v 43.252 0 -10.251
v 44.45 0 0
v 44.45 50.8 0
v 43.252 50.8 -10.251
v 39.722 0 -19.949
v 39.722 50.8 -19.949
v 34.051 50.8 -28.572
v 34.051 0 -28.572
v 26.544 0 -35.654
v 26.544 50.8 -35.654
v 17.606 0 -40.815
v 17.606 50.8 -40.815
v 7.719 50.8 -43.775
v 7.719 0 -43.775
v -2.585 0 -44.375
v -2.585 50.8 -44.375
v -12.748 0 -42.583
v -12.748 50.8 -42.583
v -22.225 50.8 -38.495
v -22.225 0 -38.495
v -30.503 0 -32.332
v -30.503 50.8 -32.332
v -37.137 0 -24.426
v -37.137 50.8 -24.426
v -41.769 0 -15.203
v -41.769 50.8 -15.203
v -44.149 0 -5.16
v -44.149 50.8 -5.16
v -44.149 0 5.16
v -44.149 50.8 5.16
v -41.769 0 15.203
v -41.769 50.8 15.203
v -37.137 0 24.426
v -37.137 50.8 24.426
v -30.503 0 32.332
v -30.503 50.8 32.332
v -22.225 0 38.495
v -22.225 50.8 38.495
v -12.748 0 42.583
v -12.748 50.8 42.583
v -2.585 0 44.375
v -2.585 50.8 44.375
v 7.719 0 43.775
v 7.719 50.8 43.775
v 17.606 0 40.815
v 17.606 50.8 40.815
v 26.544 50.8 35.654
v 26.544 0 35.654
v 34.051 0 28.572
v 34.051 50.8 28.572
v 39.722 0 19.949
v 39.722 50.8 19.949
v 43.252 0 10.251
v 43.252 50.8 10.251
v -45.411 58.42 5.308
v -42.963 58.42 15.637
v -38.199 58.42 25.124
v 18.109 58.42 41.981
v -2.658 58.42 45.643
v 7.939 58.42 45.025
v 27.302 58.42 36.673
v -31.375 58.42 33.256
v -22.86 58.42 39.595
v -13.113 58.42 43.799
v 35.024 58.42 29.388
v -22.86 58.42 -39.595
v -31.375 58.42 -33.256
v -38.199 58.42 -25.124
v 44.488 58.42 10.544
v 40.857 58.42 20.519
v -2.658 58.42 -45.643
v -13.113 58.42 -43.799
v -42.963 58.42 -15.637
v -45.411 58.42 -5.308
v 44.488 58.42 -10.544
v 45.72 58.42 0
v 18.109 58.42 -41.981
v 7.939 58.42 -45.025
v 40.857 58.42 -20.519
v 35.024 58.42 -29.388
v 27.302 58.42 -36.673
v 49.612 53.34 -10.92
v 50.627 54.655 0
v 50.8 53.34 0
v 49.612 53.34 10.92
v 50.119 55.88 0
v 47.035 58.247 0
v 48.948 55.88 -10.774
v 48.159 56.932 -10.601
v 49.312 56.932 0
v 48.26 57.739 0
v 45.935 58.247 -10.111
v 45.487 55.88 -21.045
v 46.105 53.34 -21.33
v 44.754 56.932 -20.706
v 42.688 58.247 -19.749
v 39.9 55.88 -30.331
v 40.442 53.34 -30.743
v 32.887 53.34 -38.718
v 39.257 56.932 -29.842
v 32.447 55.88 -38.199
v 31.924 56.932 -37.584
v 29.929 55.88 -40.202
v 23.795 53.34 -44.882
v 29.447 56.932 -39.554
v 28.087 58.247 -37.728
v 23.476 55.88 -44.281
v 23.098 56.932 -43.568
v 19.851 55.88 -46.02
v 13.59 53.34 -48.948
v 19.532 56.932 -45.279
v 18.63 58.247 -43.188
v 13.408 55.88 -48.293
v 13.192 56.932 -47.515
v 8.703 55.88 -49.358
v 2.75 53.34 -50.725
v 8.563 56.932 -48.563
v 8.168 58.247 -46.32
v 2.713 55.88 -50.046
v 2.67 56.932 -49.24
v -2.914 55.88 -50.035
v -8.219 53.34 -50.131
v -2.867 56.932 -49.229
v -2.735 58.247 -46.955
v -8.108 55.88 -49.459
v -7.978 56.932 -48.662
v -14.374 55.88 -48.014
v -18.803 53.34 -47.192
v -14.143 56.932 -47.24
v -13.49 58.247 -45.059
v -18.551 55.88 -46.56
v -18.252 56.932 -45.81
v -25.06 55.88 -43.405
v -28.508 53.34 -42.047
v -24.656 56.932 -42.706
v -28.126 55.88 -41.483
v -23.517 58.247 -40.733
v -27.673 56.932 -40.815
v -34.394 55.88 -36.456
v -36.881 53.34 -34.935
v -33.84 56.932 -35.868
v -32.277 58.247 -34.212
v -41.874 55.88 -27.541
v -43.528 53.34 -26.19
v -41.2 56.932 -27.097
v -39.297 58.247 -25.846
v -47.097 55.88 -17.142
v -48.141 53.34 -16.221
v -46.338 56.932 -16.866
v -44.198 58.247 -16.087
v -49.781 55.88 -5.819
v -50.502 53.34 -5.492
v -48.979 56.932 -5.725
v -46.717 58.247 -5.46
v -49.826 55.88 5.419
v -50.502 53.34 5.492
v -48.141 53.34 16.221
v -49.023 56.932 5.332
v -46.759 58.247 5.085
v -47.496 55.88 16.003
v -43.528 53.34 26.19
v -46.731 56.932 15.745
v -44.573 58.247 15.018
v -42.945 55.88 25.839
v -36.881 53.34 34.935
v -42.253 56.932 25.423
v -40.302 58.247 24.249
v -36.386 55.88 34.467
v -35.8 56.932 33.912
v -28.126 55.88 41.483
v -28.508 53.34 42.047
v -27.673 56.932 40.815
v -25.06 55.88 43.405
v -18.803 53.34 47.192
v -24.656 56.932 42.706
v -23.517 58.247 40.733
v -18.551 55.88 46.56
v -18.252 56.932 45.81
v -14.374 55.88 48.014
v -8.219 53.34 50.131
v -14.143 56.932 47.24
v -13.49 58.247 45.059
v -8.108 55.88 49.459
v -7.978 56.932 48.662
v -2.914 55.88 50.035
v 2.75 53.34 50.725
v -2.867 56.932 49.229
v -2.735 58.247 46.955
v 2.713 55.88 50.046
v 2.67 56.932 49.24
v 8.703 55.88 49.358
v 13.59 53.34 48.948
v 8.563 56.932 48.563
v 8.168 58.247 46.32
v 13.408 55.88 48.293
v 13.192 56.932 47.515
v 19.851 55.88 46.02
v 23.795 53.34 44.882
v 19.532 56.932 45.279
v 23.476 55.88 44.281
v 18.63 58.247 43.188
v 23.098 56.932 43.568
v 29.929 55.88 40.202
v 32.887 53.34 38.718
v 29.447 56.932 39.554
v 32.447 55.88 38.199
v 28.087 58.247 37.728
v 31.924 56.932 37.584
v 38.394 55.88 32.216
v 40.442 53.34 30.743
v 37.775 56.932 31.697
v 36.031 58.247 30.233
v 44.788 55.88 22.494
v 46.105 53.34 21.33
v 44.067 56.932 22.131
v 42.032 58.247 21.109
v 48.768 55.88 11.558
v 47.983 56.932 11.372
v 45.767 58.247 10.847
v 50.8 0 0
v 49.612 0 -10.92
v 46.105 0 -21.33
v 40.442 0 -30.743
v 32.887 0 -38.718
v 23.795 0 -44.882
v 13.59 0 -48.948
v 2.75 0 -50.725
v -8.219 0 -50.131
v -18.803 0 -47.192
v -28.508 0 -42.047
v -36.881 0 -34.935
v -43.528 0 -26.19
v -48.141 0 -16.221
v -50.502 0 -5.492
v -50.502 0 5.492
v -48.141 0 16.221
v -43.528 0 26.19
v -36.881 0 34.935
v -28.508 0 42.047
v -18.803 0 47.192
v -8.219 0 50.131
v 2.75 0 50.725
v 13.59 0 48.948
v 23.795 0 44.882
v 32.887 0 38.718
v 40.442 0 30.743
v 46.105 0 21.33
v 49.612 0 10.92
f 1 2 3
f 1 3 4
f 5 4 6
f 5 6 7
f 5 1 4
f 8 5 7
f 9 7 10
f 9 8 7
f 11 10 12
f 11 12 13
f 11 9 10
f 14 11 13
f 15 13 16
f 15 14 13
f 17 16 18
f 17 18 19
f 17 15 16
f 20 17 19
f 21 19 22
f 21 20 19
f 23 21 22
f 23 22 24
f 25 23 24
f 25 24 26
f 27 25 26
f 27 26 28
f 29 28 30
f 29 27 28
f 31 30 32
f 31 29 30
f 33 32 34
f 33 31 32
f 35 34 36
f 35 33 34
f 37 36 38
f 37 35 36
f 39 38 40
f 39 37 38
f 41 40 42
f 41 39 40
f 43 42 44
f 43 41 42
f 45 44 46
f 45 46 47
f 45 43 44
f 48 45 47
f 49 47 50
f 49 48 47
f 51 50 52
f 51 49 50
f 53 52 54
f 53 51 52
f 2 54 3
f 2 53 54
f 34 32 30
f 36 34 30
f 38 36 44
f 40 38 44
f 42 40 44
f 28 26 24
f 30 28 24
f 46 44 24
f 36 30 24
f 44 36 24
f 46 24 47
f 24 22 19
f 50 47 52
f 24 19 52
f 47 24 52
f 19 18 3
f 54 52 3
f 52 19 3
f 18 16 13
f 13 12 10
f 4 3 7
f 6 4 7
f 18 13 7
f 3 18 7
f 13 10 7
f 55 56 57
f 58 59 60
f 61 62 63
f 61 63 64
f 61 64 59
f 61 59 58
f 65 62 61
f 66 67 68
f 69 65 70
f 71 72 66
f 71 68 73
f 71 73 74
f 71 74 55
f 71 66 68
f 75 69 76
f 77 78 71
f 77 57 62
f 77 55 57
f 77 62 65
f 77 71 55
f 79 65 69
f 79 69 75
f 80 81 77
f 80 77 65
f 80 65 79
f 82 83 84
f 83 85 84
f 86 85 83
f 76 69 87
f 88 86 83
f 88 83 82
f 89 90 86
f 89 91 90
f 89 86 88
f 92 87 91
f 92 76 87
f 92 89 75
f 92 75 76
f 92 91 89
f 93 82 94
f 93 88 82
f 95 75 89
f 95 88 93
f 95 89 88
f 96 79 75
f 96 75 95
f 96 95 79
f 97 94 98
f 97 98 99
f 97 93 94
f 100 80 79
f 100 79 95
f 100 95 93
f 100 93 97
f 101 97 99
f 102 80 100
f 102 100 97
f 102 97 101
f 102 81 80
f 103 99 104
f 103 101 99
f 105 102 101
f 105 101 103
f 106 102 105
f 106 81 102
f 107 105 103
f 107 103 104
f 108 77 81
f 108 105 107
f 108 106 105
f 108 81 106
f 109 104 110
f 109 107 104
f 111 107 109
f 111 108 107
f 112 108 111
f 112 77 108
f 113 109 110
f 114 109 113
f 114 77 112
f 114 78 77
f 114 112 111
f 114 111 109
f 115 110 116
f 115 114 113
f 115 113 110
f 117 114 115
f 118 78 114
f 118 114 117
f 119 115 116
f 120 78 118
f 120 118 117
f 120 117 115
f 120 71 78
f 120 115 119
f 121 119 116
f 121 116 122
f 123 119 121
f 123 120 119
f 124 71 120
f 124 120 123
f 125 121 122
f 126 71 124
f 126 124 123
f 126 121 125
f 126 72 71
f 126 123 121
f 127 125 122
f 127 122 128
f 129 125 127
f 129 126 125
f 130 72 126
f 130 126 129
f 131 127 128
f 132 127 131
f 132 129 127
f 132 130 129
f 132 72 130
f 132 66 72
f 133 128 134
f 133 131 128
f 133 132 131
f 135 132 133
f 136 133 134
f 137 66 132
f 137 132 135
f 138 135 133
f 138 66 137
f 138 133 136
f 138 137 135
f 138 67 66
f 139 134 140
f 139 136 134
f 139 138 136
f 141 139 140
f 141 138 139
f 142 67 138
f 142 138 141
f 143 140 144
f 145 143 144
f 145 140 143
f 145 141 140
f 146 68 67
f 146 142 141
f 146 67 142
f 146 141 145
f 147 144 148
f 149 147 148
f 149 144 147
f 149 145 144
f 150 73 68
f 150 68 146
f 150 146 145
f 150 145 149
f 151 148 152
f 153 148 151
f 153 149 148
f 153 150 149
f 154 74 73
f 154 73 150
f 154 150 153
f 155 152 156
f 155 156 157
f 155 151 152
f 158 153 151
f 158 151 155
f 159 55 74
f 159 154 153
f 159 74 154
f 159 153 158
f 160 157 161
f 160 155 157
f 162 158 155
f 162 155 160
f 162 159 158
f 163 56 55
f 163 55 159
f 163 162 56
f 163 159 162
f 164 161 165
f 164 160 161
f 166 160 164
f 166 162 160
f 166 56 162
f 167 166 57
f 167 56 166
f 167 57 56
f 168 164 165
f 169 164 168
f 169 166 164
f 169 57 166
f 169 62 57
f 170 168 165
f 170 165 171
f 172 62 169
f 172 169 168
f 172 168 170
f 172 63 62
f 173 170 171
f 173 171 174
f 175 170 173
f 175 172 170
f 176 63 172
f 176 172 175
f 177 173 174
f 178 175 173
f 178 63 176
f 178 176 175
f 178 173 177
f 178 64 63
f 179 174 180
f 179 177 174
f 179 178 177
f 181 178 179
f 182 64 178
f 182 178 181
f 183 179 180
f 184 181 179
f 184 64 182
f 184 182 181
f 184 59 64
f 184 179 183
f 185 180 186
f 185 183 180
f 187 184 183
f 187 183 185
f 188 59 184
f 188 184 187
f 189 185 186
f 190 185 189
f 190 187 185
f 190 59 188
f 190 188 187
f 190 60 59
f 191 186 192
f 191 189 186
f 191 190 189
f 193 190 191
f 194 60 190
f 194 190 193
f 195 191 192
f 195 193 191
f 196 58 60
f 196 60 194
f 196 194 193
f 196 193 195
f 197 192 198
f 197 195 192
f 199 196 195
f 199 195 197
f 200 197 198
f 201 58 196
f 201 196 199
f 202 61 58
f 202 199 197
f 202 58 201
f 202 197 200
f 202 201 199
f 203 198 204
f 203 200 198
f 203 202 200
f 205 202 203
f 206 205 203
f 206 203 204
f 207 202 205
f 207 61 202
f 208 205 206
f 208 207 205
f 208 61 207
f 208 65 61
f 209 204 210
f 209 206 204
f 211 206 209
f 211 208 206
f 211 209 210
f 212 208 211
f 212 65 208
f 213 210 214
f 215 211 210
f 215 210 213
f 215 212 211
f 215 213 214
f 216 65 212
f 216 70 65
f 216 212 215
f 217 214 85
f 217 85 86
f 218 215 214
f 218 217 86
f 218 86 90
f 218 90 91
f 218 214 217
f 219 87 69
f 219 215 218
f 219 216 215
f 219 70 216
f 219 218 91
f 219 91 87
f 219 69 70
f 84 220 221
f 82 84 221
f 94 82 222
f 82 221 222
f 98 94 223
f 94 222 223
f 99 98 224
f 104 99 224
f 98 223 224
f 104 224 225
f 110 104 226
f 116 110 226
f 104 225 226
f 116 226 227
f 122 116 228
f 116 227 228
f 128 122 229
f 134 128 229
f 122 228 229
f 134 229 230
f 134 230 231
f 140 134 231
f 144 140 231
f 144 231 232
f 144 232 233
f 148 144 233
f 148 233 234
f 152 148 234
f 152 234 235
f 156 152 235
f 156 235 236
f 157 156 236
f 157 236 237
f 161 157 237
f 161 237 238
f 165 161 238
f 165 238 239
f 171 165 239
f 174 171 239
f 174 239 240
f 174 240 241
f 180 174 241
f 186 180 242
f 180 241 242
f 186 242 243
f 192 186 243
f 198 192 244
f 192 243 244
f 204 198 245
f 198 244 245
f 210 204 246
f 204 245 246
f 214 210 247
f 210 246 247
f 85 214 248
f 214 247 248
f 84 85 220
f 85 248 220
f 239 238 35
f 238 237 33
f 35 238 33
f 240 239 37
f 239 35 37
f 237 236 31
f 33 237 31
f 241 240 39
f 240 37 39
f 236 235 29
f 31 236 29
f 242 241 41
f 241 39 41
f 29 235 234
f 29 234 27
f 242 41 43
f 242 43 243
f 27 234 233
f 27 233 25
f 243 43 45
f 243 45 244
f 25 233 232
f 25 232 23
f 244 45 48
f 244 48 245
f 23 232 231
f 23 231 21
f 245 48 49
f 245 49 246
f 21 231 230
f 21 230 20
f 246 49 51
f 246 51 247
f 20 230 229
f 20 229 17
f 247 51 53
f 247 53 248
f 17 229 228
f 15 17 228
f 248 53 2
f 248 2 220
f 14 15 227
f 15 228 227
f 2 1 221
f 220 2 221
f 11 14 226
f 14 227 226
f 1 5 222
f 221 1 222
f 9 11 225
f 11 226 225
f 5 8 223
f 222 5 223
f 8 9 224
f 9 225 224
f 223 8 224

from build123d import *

# Parameters (mm, degrees)
SKETCH2_R           = 50.8
SKETCH2_R_2         = 44.45
BOSS_EXTRUDE2_DEPTH = 50.8
SKETCH6_R           = 50.8
BOSS_EXTRUDE3_DEPTH = 7.62
FILLET1_R           = 5.08


with BuildPart() as part:
    # Sketch2 → Boss-Extrude2 (new body)
    with BuildSketch(Plane(origin=(0, 0, 0), x_dir=(1, 0, 0), z_dir=(0, 1, 0))):
        Circle(SKETCH2_R)
        Circle(SKETCH2_R_2, mode=Mode.SUBTRACT)
    extrude(amount=BOSS_EXTRUDE2_DEPTH)

    # Sketch6 → Boss-Extrude3 (add)
    with BuildSketch(Plane(origin=(0, 50.8, 0), x_dir=(1, 0, 0), z_dir=(0, 1, 0))):
        Circle(SKETCH6_R)
    extrude(amount=BOSS_EXTRUDE3_DEPTH)

    # Fillet1
    fillet1_edges = [part.edges().sort_by_distance(p)[0] for p in [
        (-50.8, 58.42, 0),
    ]]
    fillet(fillet1_edges, radius=FILLET1_R)


solid = part.part
